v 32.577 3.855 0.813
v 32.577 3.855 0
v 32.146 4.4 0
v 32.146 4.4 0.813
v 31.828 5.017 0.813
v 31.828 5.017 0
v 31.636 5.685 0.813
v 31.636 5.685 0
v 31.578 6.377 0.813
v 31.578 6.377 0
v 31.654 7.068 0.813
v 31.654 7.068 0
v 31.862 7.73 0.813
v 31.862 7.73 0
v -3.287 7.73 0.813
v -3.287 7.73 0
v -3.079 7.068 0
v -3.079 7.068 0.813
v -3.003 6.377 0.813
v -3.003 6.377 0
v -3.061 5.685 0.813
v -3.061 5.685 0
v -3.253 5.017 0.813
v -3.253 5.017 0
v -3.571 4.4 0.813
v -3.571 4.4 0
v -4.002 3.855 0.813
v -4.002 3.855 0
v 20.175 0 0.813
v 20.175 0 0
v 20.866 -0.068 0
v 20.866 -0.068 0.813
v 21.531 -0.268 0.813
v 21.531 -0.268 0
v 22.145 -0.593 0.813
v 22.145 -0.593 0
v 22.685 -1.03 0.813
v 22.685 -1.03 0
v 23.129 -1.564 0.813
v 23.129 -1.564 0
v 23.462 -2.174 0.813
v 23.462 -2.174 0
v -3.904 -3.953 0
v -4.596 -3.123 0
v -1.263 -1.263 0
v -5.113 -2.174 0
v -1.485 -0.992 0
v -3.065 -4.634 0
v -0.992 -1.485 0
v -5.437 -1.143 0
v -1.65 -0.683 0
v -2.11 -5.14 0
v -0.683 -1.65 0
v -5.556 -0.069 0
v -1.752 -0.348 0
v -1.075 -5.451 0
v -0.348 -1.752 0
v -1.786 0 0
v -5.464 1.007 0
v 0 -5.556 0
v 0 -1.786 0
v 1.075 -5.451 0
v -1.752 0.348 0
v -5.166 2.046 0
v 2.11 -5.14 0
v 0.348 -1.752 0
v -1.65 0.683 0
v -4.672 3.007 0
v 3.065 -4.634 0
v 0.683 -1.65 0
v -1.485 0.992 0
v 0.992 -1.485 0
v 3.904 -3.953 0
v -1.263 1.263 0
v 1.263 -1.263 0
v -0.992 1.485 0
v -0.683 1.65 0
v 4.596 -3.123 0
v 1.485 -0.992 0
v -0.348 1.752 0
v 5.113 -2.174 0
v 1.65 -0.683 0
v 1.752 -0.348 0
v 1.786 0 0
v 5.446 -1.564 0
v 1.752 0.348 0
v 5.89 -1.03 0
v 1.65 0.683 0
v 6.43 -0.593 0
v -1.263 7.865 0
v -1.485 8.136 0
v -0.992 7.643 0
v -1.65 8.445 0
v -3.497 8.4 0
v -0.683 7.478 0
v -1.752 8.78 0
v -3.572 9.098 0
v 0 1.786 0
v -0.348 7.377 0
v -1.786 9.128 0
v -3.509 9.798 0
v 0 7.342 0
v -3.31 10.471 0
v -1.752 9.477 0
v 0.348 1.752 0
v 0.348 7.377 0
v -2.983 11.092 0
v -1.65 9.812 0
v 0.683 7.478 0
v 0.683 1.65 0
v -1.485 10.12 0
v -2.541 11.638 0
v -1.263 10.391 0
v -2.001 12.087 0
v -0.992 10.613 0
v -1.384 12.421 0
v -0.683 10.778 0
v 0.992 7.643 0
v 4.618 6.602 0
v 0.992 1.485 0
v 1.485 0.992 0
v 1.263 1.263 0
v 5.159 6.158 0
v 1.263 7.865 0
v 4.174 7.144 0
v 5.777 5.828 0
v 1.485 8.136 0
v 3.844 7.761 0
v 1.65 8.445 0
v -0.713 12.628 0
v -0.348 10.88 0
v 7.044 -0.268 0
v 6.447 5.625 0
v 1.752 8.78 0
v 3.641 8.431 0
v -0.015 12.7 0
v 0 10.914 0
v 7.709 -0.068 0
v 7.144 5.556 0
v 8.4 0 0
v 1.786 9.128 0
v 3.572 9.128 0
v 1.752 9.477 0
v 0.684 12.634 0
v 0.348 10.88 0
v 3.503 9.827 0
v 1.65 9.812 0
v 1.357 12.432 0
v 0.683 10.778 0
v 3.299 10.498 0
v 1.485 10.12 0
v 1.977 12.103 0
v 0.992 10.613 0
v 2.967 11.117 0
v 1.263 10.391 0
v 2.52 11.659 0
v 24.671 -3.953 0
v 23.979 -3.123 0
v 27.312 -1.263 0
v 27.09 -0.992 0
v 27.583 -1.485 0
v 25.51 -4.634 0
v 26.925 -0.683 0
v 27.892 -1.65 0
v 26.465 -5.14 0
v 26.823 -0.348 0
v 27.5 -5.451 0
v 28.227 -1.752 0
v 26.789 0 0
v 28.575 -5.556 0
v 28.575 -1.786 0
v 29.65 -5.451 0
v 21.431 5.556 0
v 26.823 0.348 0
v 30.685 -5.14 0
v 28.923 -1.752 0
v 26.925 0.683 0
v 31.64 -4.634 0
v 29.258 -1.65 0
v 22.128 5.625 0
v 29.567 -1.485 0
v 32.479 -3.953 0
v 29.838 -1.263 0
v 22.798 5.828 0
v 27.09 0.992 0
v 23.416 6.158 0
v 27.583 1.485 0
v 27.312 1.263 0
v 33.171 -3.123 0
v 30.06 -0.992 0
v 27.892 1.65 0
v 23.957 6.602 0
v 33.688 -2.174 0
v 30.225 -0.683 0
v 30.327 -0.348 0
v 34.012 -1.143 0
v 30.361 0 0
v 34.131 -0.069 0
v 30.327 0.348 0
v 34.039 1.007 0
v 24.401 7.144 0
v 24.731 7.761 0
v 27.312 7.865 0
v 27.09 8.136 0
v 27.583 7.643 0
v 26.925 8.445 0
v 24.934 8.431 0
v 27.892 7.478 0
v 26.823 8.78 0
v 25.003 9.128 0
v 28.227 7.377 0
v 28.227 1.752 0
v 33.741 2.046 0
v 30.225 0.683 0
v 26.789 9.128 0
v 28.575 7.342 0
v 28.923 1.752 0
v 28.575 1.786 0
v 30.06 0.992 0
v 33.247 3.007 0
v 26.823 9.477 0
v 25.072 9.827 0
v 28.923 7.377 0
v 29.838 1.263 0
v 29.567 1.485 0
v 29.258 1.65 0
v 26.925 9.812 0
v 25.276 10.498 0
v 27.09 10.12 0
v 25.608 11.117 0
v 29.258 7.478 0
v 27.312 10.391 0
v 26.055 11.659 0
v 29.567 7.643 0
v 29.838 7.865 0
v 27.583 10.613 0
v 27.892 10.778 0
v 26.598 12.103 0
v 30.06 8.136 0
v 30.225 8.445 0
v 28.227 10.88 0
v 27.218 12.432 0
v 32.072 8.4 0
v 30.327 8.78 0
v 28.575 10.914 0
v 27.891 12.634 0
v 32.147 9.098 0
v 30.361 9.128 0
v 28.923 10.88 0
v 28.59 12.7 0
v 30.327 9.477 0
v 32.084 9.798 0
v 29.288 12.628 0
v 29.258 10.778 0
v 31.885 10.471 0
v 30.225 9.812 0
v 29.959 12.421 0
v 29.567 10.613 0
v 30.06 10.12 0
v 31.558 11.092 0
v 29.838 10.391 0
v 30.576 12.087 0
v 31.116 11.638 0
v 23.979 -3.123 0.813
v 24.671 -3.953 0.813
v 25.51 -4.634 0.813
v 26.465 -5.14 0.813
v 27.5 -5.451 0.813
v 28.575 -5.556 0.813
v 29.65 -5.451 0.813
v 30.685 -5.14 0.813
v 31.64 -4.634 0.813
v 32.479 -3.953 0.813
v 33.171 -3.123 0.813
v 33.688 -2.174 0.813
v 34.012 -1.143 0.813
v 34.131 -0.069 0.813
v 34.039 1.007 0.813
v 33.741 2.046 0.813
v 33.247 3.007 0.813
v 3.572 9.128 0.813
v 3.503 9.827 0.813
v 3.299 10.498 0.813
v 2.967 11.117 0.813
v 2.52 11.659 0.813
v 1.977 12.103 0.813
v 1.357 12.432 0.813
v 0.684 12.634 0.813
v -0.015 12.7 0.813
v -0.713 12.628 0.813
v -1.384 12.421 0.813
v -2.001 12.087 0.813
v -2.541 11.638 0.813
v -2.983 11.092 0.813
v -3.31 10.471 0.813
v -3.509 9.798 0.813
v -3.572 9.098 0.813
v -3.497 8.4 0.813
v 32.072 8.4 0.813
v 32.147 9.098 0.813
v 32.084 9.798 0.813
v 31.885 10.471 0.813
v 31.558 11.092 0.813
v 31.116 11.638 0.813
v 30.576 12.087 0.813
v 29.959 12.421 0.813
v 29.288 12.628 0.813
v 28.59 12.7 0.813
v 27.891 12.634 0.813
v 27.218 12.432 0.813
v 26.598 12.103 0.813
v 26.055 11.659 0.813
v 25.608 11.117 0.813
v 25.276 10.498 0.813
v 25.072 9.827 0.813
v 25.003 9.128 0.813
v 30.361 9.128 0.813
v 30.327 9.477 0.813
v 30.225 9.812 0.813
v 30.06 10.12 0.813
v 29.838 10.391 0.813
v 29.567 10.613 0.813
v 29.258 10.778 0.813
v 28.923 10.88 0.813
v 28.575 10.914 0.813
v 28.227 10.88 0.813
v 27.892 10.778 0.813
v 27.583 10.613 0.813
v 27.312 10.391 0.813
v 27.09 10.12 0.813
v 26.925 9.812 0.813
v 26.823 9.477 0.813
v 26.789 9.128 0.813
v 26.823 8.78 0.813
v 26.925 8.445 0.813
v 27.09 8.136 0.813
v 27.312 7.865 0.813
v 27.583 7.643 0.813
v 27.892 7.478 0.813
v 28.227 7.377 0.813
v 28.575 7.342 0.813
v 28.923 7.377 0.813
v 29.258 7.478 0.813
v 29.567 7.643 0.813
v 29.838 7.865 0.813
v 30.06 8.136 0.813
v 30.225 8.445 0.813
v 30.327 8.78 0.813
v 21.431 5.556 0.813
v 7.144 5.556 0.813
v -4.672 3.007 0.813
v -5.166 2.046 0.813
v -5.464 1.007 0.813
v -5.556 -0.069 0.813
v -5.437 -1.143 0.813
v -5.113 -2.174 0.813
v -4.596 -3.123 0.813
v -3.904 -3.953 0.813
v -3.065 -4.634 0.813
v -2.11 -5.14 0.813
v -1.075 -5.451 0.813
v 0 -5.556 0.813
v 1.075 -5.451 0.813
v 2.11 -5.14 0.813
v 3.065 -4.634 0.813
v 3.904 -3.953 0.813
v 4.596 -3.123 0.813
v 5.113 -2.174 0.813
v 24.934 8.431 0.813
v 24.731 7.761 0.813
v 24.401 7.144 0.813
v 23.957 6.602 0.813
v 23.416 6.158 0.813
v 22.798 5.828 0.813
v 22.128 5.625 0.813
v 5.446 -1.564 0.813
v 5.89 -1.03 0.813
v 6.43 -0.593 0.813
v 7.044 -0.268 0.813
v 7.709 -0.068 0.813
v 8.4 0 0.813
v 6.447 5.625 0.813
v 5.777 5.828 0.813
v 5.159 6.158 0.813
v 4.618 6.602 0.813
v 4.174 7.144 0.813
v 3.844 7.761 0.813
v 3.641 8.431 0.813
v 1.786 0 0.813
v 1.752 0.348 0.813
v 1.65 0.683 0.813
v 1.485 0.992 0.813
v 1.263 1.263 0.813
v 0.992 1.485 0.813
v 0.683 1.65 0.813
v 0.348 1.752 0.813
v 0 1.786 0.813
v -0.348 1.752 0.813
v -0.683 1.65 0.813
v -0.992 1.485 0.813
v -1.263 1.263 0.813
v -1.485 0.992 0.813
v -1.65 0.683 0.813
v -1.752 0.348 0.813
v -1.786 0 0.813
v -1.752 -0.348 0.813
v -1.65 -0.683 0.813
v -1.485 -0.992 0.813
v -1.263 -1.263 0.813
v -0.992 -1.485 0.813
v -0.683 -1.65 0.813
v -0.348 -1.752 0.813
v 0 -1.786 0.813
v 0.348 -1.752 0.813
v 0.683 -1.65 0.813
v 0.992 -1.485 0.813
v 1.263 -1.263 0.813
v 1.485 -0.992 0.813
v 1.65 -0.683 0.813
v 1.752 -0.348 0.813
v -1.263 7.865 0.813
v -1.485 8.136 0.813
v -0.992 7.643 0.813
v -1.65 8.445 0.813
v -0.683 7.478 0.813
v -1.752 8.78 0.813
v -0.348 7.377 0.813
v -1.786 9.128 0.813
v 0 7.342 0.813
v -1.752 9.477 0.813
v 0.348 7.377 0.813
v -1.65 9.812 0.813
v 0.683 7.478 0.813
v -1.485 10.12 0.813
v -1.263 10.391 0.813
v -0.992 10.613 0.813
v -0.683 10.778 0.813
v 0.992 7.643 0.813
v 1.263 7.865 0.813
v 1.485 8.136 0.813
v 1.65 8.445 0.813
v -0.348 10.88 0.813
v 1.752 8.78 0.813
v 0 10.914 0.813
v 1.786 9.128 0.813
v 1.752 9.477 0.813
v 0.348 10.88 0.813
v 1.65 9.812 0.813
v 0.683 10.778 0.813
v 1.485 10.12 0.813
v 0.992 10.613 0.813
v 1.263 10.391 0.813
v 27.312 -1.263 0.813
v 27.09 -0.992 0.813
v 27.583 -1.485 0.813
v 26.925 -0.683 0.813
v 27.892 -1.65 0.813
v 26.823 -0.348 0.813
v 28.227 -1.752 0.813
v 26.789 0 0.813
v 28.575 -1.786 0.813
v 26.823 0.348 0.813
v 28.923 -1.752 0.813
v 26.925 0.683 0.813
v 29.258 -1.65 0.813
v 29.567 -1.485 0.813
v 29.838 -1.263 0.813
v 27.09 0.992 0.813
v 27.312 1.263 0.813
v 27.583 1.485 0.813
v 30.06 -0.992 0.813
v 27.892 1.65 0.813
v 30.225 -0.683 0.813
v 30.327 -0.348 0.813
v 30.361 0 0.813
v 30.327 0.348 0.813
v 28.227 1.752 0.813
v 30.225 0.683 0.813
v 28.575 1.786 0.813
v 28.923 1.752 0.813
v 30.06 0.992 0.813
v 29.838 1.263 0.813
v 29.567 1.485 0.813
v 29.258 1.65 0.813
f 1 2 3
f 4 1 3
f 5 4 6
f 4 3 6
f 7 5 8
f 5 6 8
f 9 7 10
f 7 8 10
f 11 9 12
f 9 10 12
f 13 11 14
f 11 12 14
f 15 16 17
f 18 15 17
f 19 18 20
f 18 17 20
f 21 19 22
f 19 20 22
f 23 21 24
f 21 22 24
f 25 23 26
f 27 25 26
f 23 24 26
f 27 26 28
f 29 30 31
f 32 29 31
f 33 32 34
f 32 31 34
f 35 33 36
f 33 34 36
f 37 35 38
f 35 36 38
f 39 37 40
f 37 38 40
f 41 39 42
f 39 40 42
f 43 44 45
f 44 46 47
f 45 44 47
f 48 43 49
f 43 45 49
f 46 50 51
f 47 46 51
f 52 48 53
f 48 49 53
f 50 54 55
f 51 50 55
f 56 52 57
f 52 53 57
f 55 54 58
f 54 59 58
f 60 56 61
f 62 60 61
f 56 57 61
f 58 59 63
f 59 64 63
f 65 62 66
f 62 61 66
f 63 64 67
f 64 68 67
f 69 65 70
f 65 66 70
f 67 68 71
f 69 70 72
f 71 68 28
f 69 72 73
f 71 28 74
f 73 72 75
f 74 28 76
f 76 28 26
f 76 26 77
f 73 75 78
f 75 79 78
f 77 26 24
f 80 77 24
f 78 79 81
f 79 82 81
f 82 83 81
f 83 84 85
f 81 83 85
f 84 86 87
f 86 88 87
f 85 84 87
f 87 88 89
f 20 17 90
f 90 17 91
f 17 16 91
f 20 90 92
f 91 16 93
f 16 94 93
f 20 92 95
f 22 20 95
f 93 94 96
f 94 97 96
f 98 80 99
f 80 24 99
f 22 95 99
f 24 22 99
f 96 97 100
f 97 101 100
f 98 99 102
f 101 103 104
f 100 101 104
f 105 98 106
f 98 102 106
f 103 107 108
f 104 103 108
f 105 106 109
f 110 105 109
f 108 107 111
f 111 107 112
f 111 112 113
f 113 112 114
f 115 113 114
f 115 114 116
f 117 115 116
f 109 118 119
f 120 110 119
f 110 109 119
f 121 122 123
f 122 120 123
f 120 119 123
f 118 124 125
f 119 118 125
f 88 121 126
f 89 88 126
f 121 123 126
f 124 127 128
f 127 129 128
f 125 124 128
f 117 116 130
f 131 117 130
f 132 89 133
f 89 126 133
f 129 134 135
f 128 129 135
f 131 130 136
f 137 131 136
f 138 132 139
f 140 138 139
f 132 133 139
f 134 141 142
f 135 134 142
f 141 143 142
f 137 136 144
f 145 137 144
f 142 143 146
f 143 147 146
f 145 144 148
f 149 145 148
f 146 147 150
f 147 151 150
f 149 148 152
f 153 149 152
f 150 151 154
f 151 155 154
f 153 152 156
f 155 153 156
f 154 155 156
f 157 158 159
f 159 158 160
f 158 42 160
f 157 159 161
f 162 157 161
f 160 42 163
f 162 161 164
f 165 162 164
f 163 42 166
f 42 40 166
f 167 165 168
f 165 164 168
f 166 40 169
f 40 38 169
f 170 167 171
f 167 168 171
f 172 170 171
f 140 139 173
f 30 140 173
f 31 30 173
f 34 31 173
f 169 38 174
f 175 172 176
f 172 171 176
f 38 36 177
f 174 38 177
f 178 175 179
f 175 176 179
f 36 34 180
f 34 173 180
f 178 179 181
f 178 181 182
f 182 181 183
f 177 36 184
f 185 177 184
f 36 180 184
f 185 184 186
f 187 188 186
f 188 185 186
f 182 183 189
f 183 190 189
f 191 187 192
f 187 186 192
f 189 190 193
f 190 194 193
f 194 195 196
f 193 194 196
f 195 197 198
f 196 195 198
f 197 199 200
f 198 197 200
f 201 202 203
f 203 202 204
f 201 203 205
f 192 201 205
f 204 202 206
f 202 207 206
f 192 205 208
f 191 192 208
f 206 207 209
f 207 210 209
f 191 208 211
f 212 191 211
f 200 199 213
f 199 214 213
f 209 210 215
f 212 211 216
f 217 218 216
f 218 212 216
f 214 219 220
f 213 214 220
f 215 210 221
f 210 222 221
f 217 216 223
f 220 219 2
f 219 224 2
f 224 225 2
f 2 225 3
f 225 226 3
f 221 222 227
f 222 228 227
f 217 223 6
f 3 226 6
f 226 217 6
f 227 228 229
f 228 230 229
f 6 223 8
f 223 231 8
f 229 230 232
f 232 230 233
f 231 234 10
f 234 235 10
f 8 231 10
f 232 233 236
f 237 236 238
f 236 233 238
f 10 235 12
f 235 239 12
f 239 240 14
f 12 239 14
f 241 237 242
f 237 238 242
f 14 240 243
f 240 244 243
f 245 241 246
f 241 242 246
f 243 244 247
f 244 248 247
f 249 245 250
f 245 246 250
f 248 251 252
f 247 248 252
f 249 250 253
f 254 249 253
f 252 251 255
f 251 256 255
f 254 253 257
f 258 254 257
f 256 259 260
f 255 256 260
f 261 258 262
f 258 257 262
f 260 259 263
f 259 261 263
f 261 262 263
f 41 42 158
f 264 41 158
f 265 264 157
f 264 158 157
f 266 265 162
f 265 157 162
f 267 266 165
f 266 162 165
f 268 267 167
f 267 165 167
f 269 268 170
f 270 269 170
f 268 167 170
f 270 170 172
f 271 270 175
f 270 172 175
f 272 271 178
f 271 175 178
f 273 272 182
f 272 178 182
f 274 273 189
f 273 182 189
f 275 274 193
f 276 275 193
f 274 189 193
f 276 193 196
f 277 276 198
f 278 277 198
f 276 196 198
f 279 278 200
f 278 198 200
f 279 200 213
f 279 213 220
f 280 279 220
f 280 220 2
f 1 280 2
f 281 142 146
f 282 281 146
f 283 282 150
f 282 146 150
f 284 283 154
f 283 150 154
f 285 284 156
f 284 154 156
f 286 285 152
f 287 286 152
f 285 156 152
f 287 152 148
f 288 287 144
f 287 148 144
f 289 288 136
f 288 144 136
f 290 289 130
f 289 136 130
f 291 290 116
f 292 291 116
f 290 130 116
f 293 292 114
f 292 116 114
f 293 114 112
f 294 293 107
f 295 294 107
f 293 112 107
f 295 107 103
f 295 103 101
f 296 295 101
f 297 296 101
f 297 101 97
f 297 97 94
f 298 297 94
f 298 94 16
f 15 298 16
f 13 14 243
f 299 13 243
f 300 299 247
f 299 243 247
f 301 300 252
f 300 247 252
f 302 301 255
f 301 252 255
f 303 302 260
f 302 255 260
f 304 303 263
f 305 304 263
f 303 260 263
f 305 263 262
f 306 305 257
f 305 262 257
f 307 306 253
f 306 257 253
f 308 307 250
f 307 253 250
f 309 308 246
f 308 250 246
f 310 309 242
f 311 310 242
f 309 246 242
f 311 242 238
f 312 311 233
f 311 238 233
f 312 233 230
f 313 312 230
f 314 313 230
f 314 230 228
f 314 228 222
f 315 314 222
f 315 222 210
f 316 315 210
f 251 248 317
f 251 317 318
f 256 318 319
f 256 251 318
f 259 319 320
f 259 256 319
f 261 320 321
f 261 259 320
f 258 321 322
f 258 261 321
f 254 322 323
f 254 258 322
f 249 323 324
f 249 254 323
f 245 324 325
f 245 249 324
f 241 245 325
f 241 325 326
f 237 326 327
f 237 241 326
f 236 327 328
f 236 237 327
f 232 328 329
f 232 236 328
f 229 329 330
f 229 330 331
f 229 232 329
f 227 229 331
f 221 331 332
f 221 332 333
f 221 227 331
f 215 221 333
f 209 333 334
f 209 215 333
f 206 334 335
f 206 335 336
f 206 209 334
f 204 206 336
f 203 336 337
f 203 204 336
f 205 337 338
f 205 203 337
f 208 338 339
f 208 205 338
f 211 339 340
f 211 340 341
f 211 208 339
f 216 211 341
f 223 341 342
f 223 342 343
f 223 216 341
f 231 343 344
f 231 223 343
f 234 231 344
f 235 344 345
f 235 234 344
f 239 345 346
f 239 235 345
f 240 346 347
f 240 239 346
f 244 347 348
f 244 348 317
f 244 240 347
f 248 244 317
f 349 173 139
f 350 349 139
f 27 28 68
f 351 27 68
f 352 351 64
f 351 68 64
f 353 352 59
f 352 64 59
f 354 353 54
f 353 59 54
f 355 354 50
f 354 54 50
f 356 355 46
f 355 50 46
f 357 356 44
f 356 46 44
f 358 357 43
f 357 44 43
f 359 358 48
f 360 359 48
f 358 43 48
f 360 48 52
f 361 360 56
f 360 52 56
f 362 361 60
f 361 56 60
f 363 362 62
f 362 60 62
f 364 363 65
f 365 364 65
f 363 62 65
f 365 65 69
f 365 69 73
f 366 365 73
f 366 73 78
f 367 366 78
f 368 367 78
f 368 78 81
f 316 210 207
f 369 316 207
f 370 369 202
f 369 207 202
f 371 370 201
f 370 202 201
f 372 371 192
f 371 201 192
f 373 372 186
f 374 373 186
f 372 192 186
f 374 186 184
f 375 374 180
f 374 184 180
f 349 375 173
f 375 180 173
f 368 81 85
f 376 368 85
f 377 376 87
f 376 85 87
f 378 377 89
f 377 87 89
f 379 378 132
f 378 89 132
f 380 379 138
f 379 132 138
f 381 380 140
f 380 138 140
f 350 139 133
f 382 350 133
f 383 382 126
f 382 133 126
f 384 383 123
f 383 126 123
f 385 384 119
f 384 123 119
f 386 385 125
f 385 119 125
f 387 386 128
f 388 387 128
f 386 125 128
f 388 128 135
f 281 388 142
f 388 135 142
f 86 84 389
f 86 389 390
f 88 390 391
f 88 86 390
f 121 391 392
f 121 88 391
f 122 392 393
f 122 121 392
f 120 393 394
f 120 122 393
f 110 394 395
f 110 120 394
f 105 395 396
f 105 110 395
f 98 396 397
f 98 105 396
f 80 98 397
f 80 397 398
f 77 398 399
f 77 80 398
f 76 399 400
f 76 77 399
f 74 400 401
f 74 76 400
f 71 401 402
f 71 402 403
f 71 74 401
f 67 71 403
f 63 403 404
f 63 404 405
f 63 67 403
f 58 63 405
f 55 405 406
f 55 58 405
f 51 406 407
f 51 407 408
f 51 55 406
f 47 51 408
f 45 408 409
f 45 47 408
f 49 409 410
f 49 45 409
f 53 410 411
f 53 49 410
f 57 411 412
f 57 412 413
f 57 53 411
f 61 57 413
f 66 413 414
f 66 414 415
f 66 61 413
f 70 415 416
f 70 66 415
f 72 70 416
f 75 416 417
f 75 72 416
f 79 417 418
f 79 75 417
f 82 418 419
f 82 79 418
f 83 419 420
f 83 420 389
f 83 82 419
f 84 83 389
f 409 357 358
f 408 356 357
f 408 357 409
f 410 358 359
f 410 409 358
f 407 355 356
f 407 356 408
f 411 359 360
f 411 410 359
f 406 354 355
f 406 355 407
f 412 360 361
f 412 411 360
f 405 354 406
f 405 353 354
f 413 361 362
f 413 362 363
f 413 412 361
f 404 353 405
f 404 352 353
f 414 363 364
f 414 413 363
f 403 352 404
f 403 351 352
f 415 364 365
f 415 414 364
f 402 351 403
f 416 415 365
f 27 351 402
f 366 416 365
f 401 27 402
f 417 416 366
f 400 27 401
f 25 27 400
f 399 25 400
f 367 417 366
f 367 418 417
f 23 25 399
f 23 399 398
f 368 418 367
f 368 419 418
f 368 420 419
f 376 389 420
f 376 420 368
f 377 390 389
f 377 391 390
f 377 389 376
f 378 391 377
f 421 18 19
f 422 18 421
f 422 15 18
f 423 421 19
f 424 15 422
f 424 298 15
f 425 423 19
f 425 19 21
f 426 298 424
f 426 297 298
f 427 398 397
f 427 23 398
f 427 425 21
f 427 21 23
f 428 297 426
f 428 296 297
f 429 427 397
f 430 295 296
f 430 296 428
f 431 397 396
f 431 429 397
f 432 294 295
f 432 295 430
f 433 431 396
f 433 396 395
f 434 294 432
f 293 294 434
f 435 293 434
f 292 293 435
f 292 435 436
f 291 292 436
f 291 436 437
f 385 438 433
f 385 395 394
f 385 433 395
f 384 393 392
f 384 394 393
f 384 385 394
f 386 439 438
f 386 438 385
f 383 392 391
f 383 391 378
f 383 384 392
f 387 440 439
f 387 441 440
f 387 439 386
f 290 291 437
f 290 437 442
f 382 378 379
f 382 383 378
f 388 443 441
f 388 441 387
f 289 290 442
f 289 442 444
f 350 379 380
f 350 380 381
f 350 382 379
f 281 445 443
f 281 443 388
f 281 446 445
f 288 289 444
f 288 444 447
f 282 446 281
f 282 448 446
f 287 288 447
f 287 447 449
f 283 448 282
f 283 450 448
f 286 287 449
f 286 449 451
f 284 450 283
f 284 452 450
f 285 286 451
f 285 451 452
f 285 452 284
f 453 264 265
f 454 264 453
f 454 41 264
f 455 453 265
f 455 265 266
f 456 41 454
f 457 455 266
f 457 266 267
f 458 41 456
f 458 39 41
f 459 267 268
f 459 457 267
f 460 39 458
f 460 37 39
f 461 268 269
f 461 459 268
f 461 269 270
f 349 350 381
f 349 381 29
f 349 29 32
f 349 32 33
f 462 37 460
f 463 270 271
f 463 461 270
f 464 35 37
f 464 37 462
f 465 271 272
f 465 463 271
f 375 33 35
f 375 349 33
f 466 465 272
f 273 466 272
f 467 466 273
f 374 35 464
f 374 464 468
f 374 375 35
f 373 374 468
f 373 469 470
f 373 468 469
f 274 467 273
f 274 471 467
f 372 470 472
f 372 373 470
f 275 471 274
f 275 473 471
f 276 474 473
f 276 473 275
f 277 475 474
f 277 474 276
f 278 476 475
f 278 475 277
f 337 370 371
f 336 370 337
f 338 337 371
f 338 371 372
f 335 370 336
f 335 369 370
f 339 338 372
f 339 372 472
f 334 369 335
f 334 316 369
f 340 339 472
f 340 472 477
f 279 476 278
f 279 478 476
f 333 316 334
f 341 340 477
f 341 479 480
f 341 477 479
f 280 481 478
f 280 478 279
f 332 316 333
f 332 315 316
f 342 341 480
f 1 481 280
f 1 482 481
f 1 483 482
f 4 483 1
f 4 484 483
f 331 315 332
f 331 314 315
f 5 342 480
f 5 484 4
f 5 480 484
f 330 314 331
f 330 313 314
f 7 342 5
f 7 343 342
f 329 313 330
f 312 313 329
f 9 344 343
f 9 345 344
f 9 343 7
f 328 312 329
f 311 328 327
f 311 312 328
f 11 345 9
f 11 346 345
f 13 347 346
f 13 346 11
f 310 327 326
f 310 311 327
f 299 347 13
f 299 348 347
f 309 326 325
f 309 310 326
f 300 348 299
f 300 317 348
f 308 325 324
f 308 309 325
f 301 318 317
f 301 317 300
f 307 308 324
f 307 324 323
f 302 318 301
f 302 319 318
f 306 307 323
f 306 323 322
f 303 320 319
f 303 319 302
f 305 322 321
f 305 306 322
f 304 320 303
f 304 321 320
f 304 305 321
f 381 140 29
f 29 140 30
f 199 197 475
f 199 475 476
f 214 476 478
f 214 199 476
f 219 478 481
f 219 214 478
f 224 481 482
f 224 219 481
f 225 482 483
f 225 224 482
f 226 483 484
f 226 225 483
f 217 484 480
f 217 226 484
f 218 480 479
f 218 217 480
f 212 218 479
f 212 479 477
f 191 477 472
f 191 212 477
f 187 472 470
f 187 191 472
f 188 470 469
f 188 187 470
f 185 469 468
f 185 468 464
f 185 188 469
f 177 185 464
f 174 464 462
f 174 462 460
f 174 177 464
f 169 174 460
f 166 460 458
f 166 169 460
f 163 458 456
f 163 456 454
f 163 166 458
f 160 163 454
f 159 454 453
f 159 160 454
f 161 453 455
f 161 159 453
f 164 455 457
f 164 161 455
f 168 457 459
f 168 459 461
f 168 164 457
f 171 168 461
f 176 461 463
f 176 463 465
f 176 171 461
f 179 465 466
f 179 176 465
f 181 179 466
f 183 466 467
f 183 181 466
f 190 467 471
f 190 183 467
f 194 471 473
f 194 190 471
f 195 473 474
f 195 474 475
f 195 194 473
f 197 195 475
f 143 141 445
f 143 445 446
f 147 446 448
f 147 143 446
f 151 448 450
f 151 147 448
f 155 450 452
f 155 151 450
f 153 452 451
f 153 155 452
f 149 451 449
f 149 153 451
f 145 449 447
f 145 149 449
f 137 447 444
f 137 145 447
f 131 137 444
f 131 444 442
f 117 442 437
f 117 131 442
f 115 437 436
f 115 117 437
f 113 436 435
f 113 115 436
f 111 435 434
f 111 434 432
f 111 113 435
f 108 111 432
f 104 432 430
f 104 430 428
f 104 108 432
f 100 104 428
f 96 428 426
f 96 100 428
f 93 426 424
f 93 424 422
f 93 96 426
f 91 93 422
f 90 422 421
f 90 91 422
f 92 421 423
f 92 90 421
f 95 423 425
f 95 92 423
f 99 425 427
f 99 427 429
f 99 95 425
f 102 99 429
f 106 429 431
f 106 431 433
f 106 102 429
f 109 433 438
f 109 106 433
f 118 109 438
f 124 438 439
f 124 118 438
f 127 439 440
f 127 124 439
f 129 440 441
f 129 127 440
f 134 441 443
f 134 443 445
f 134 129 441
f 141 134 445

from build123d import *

# Parameters (mm, degrees)
SKETCH1_R           = 1.7859375
BOSS_EXTRUDE1_DEPTH = 0.8128


with BuildPart() as part:
    # Sketch1 → Boss-Extrude1 (new body)
    with BuildSketch(Plane.XY):
        with BuildLine():
            ThreePointArc((5.113201981, -2.174184805), (6.429738102, -0.592725316), (8.400260413, 0))
            Line((8.400260413, 0), (20.174739587, 0))
            ThreePointArc((20.174739587, 0), (22.145261898, -0.592725316), (23.461798019, -2.174184805))
            ThreePointArc((23.461798019, -2.174184805), (31.640256951, -4.634232826), (32.576636291, 3.854714135))
            ThreePointArc((32.576636291, 3.854714135), (31.636446649, 5.685103372), (31.862058429, 7.730434799))
            ThreePointArc((31.862058429, 7.730434799), (29.288207259, 12.628071631), (25.003125, 9.128125))
            ThreePointArc((25.003125, 9.128125), (23.956947034, 6.602427966), (21.43125, 5.55625))
            Line((21.43125, 5.55625), (7.14375, 5.55625))
            ThreePointArc((7.14375, 5.55625), (4.618052966, 6.602427966), (3.571875, 9.128125))
            ThreePointArc((3.571875, 9.128125), (-0.713207259, 12.628071631), (-3.287058429, 7.730434799))
            ThreePointArc((-3.287058429, 7.730434799), (-3.061446655, 5.68510334), (-4.001636336, 3.854714088))
            ThreePointArc((-4.001636336, 3.854714088), (-3.065256924, -4.634232844), (5.113201981, -2.174184805))
        make_face()
        Circle(SKETCH1_R, mode=Mode.SUBTRACT)
        with Locations((28.575, 0)):
            Circle(SKETCH1_R, mode=Mode.SUBTRACT)
        with Locations((0, 9.128125)):
            Circle(SKETCH1_R, mode=Mode.SUBTRACT)
        with Locations((28.575, 9.128125)):
            Circle(SKETCH1_R, mode=Mode.SUBTRACT)
    extrude(amount=BOSS_EXTRUDE1_DEPTH)


solid = part.part
